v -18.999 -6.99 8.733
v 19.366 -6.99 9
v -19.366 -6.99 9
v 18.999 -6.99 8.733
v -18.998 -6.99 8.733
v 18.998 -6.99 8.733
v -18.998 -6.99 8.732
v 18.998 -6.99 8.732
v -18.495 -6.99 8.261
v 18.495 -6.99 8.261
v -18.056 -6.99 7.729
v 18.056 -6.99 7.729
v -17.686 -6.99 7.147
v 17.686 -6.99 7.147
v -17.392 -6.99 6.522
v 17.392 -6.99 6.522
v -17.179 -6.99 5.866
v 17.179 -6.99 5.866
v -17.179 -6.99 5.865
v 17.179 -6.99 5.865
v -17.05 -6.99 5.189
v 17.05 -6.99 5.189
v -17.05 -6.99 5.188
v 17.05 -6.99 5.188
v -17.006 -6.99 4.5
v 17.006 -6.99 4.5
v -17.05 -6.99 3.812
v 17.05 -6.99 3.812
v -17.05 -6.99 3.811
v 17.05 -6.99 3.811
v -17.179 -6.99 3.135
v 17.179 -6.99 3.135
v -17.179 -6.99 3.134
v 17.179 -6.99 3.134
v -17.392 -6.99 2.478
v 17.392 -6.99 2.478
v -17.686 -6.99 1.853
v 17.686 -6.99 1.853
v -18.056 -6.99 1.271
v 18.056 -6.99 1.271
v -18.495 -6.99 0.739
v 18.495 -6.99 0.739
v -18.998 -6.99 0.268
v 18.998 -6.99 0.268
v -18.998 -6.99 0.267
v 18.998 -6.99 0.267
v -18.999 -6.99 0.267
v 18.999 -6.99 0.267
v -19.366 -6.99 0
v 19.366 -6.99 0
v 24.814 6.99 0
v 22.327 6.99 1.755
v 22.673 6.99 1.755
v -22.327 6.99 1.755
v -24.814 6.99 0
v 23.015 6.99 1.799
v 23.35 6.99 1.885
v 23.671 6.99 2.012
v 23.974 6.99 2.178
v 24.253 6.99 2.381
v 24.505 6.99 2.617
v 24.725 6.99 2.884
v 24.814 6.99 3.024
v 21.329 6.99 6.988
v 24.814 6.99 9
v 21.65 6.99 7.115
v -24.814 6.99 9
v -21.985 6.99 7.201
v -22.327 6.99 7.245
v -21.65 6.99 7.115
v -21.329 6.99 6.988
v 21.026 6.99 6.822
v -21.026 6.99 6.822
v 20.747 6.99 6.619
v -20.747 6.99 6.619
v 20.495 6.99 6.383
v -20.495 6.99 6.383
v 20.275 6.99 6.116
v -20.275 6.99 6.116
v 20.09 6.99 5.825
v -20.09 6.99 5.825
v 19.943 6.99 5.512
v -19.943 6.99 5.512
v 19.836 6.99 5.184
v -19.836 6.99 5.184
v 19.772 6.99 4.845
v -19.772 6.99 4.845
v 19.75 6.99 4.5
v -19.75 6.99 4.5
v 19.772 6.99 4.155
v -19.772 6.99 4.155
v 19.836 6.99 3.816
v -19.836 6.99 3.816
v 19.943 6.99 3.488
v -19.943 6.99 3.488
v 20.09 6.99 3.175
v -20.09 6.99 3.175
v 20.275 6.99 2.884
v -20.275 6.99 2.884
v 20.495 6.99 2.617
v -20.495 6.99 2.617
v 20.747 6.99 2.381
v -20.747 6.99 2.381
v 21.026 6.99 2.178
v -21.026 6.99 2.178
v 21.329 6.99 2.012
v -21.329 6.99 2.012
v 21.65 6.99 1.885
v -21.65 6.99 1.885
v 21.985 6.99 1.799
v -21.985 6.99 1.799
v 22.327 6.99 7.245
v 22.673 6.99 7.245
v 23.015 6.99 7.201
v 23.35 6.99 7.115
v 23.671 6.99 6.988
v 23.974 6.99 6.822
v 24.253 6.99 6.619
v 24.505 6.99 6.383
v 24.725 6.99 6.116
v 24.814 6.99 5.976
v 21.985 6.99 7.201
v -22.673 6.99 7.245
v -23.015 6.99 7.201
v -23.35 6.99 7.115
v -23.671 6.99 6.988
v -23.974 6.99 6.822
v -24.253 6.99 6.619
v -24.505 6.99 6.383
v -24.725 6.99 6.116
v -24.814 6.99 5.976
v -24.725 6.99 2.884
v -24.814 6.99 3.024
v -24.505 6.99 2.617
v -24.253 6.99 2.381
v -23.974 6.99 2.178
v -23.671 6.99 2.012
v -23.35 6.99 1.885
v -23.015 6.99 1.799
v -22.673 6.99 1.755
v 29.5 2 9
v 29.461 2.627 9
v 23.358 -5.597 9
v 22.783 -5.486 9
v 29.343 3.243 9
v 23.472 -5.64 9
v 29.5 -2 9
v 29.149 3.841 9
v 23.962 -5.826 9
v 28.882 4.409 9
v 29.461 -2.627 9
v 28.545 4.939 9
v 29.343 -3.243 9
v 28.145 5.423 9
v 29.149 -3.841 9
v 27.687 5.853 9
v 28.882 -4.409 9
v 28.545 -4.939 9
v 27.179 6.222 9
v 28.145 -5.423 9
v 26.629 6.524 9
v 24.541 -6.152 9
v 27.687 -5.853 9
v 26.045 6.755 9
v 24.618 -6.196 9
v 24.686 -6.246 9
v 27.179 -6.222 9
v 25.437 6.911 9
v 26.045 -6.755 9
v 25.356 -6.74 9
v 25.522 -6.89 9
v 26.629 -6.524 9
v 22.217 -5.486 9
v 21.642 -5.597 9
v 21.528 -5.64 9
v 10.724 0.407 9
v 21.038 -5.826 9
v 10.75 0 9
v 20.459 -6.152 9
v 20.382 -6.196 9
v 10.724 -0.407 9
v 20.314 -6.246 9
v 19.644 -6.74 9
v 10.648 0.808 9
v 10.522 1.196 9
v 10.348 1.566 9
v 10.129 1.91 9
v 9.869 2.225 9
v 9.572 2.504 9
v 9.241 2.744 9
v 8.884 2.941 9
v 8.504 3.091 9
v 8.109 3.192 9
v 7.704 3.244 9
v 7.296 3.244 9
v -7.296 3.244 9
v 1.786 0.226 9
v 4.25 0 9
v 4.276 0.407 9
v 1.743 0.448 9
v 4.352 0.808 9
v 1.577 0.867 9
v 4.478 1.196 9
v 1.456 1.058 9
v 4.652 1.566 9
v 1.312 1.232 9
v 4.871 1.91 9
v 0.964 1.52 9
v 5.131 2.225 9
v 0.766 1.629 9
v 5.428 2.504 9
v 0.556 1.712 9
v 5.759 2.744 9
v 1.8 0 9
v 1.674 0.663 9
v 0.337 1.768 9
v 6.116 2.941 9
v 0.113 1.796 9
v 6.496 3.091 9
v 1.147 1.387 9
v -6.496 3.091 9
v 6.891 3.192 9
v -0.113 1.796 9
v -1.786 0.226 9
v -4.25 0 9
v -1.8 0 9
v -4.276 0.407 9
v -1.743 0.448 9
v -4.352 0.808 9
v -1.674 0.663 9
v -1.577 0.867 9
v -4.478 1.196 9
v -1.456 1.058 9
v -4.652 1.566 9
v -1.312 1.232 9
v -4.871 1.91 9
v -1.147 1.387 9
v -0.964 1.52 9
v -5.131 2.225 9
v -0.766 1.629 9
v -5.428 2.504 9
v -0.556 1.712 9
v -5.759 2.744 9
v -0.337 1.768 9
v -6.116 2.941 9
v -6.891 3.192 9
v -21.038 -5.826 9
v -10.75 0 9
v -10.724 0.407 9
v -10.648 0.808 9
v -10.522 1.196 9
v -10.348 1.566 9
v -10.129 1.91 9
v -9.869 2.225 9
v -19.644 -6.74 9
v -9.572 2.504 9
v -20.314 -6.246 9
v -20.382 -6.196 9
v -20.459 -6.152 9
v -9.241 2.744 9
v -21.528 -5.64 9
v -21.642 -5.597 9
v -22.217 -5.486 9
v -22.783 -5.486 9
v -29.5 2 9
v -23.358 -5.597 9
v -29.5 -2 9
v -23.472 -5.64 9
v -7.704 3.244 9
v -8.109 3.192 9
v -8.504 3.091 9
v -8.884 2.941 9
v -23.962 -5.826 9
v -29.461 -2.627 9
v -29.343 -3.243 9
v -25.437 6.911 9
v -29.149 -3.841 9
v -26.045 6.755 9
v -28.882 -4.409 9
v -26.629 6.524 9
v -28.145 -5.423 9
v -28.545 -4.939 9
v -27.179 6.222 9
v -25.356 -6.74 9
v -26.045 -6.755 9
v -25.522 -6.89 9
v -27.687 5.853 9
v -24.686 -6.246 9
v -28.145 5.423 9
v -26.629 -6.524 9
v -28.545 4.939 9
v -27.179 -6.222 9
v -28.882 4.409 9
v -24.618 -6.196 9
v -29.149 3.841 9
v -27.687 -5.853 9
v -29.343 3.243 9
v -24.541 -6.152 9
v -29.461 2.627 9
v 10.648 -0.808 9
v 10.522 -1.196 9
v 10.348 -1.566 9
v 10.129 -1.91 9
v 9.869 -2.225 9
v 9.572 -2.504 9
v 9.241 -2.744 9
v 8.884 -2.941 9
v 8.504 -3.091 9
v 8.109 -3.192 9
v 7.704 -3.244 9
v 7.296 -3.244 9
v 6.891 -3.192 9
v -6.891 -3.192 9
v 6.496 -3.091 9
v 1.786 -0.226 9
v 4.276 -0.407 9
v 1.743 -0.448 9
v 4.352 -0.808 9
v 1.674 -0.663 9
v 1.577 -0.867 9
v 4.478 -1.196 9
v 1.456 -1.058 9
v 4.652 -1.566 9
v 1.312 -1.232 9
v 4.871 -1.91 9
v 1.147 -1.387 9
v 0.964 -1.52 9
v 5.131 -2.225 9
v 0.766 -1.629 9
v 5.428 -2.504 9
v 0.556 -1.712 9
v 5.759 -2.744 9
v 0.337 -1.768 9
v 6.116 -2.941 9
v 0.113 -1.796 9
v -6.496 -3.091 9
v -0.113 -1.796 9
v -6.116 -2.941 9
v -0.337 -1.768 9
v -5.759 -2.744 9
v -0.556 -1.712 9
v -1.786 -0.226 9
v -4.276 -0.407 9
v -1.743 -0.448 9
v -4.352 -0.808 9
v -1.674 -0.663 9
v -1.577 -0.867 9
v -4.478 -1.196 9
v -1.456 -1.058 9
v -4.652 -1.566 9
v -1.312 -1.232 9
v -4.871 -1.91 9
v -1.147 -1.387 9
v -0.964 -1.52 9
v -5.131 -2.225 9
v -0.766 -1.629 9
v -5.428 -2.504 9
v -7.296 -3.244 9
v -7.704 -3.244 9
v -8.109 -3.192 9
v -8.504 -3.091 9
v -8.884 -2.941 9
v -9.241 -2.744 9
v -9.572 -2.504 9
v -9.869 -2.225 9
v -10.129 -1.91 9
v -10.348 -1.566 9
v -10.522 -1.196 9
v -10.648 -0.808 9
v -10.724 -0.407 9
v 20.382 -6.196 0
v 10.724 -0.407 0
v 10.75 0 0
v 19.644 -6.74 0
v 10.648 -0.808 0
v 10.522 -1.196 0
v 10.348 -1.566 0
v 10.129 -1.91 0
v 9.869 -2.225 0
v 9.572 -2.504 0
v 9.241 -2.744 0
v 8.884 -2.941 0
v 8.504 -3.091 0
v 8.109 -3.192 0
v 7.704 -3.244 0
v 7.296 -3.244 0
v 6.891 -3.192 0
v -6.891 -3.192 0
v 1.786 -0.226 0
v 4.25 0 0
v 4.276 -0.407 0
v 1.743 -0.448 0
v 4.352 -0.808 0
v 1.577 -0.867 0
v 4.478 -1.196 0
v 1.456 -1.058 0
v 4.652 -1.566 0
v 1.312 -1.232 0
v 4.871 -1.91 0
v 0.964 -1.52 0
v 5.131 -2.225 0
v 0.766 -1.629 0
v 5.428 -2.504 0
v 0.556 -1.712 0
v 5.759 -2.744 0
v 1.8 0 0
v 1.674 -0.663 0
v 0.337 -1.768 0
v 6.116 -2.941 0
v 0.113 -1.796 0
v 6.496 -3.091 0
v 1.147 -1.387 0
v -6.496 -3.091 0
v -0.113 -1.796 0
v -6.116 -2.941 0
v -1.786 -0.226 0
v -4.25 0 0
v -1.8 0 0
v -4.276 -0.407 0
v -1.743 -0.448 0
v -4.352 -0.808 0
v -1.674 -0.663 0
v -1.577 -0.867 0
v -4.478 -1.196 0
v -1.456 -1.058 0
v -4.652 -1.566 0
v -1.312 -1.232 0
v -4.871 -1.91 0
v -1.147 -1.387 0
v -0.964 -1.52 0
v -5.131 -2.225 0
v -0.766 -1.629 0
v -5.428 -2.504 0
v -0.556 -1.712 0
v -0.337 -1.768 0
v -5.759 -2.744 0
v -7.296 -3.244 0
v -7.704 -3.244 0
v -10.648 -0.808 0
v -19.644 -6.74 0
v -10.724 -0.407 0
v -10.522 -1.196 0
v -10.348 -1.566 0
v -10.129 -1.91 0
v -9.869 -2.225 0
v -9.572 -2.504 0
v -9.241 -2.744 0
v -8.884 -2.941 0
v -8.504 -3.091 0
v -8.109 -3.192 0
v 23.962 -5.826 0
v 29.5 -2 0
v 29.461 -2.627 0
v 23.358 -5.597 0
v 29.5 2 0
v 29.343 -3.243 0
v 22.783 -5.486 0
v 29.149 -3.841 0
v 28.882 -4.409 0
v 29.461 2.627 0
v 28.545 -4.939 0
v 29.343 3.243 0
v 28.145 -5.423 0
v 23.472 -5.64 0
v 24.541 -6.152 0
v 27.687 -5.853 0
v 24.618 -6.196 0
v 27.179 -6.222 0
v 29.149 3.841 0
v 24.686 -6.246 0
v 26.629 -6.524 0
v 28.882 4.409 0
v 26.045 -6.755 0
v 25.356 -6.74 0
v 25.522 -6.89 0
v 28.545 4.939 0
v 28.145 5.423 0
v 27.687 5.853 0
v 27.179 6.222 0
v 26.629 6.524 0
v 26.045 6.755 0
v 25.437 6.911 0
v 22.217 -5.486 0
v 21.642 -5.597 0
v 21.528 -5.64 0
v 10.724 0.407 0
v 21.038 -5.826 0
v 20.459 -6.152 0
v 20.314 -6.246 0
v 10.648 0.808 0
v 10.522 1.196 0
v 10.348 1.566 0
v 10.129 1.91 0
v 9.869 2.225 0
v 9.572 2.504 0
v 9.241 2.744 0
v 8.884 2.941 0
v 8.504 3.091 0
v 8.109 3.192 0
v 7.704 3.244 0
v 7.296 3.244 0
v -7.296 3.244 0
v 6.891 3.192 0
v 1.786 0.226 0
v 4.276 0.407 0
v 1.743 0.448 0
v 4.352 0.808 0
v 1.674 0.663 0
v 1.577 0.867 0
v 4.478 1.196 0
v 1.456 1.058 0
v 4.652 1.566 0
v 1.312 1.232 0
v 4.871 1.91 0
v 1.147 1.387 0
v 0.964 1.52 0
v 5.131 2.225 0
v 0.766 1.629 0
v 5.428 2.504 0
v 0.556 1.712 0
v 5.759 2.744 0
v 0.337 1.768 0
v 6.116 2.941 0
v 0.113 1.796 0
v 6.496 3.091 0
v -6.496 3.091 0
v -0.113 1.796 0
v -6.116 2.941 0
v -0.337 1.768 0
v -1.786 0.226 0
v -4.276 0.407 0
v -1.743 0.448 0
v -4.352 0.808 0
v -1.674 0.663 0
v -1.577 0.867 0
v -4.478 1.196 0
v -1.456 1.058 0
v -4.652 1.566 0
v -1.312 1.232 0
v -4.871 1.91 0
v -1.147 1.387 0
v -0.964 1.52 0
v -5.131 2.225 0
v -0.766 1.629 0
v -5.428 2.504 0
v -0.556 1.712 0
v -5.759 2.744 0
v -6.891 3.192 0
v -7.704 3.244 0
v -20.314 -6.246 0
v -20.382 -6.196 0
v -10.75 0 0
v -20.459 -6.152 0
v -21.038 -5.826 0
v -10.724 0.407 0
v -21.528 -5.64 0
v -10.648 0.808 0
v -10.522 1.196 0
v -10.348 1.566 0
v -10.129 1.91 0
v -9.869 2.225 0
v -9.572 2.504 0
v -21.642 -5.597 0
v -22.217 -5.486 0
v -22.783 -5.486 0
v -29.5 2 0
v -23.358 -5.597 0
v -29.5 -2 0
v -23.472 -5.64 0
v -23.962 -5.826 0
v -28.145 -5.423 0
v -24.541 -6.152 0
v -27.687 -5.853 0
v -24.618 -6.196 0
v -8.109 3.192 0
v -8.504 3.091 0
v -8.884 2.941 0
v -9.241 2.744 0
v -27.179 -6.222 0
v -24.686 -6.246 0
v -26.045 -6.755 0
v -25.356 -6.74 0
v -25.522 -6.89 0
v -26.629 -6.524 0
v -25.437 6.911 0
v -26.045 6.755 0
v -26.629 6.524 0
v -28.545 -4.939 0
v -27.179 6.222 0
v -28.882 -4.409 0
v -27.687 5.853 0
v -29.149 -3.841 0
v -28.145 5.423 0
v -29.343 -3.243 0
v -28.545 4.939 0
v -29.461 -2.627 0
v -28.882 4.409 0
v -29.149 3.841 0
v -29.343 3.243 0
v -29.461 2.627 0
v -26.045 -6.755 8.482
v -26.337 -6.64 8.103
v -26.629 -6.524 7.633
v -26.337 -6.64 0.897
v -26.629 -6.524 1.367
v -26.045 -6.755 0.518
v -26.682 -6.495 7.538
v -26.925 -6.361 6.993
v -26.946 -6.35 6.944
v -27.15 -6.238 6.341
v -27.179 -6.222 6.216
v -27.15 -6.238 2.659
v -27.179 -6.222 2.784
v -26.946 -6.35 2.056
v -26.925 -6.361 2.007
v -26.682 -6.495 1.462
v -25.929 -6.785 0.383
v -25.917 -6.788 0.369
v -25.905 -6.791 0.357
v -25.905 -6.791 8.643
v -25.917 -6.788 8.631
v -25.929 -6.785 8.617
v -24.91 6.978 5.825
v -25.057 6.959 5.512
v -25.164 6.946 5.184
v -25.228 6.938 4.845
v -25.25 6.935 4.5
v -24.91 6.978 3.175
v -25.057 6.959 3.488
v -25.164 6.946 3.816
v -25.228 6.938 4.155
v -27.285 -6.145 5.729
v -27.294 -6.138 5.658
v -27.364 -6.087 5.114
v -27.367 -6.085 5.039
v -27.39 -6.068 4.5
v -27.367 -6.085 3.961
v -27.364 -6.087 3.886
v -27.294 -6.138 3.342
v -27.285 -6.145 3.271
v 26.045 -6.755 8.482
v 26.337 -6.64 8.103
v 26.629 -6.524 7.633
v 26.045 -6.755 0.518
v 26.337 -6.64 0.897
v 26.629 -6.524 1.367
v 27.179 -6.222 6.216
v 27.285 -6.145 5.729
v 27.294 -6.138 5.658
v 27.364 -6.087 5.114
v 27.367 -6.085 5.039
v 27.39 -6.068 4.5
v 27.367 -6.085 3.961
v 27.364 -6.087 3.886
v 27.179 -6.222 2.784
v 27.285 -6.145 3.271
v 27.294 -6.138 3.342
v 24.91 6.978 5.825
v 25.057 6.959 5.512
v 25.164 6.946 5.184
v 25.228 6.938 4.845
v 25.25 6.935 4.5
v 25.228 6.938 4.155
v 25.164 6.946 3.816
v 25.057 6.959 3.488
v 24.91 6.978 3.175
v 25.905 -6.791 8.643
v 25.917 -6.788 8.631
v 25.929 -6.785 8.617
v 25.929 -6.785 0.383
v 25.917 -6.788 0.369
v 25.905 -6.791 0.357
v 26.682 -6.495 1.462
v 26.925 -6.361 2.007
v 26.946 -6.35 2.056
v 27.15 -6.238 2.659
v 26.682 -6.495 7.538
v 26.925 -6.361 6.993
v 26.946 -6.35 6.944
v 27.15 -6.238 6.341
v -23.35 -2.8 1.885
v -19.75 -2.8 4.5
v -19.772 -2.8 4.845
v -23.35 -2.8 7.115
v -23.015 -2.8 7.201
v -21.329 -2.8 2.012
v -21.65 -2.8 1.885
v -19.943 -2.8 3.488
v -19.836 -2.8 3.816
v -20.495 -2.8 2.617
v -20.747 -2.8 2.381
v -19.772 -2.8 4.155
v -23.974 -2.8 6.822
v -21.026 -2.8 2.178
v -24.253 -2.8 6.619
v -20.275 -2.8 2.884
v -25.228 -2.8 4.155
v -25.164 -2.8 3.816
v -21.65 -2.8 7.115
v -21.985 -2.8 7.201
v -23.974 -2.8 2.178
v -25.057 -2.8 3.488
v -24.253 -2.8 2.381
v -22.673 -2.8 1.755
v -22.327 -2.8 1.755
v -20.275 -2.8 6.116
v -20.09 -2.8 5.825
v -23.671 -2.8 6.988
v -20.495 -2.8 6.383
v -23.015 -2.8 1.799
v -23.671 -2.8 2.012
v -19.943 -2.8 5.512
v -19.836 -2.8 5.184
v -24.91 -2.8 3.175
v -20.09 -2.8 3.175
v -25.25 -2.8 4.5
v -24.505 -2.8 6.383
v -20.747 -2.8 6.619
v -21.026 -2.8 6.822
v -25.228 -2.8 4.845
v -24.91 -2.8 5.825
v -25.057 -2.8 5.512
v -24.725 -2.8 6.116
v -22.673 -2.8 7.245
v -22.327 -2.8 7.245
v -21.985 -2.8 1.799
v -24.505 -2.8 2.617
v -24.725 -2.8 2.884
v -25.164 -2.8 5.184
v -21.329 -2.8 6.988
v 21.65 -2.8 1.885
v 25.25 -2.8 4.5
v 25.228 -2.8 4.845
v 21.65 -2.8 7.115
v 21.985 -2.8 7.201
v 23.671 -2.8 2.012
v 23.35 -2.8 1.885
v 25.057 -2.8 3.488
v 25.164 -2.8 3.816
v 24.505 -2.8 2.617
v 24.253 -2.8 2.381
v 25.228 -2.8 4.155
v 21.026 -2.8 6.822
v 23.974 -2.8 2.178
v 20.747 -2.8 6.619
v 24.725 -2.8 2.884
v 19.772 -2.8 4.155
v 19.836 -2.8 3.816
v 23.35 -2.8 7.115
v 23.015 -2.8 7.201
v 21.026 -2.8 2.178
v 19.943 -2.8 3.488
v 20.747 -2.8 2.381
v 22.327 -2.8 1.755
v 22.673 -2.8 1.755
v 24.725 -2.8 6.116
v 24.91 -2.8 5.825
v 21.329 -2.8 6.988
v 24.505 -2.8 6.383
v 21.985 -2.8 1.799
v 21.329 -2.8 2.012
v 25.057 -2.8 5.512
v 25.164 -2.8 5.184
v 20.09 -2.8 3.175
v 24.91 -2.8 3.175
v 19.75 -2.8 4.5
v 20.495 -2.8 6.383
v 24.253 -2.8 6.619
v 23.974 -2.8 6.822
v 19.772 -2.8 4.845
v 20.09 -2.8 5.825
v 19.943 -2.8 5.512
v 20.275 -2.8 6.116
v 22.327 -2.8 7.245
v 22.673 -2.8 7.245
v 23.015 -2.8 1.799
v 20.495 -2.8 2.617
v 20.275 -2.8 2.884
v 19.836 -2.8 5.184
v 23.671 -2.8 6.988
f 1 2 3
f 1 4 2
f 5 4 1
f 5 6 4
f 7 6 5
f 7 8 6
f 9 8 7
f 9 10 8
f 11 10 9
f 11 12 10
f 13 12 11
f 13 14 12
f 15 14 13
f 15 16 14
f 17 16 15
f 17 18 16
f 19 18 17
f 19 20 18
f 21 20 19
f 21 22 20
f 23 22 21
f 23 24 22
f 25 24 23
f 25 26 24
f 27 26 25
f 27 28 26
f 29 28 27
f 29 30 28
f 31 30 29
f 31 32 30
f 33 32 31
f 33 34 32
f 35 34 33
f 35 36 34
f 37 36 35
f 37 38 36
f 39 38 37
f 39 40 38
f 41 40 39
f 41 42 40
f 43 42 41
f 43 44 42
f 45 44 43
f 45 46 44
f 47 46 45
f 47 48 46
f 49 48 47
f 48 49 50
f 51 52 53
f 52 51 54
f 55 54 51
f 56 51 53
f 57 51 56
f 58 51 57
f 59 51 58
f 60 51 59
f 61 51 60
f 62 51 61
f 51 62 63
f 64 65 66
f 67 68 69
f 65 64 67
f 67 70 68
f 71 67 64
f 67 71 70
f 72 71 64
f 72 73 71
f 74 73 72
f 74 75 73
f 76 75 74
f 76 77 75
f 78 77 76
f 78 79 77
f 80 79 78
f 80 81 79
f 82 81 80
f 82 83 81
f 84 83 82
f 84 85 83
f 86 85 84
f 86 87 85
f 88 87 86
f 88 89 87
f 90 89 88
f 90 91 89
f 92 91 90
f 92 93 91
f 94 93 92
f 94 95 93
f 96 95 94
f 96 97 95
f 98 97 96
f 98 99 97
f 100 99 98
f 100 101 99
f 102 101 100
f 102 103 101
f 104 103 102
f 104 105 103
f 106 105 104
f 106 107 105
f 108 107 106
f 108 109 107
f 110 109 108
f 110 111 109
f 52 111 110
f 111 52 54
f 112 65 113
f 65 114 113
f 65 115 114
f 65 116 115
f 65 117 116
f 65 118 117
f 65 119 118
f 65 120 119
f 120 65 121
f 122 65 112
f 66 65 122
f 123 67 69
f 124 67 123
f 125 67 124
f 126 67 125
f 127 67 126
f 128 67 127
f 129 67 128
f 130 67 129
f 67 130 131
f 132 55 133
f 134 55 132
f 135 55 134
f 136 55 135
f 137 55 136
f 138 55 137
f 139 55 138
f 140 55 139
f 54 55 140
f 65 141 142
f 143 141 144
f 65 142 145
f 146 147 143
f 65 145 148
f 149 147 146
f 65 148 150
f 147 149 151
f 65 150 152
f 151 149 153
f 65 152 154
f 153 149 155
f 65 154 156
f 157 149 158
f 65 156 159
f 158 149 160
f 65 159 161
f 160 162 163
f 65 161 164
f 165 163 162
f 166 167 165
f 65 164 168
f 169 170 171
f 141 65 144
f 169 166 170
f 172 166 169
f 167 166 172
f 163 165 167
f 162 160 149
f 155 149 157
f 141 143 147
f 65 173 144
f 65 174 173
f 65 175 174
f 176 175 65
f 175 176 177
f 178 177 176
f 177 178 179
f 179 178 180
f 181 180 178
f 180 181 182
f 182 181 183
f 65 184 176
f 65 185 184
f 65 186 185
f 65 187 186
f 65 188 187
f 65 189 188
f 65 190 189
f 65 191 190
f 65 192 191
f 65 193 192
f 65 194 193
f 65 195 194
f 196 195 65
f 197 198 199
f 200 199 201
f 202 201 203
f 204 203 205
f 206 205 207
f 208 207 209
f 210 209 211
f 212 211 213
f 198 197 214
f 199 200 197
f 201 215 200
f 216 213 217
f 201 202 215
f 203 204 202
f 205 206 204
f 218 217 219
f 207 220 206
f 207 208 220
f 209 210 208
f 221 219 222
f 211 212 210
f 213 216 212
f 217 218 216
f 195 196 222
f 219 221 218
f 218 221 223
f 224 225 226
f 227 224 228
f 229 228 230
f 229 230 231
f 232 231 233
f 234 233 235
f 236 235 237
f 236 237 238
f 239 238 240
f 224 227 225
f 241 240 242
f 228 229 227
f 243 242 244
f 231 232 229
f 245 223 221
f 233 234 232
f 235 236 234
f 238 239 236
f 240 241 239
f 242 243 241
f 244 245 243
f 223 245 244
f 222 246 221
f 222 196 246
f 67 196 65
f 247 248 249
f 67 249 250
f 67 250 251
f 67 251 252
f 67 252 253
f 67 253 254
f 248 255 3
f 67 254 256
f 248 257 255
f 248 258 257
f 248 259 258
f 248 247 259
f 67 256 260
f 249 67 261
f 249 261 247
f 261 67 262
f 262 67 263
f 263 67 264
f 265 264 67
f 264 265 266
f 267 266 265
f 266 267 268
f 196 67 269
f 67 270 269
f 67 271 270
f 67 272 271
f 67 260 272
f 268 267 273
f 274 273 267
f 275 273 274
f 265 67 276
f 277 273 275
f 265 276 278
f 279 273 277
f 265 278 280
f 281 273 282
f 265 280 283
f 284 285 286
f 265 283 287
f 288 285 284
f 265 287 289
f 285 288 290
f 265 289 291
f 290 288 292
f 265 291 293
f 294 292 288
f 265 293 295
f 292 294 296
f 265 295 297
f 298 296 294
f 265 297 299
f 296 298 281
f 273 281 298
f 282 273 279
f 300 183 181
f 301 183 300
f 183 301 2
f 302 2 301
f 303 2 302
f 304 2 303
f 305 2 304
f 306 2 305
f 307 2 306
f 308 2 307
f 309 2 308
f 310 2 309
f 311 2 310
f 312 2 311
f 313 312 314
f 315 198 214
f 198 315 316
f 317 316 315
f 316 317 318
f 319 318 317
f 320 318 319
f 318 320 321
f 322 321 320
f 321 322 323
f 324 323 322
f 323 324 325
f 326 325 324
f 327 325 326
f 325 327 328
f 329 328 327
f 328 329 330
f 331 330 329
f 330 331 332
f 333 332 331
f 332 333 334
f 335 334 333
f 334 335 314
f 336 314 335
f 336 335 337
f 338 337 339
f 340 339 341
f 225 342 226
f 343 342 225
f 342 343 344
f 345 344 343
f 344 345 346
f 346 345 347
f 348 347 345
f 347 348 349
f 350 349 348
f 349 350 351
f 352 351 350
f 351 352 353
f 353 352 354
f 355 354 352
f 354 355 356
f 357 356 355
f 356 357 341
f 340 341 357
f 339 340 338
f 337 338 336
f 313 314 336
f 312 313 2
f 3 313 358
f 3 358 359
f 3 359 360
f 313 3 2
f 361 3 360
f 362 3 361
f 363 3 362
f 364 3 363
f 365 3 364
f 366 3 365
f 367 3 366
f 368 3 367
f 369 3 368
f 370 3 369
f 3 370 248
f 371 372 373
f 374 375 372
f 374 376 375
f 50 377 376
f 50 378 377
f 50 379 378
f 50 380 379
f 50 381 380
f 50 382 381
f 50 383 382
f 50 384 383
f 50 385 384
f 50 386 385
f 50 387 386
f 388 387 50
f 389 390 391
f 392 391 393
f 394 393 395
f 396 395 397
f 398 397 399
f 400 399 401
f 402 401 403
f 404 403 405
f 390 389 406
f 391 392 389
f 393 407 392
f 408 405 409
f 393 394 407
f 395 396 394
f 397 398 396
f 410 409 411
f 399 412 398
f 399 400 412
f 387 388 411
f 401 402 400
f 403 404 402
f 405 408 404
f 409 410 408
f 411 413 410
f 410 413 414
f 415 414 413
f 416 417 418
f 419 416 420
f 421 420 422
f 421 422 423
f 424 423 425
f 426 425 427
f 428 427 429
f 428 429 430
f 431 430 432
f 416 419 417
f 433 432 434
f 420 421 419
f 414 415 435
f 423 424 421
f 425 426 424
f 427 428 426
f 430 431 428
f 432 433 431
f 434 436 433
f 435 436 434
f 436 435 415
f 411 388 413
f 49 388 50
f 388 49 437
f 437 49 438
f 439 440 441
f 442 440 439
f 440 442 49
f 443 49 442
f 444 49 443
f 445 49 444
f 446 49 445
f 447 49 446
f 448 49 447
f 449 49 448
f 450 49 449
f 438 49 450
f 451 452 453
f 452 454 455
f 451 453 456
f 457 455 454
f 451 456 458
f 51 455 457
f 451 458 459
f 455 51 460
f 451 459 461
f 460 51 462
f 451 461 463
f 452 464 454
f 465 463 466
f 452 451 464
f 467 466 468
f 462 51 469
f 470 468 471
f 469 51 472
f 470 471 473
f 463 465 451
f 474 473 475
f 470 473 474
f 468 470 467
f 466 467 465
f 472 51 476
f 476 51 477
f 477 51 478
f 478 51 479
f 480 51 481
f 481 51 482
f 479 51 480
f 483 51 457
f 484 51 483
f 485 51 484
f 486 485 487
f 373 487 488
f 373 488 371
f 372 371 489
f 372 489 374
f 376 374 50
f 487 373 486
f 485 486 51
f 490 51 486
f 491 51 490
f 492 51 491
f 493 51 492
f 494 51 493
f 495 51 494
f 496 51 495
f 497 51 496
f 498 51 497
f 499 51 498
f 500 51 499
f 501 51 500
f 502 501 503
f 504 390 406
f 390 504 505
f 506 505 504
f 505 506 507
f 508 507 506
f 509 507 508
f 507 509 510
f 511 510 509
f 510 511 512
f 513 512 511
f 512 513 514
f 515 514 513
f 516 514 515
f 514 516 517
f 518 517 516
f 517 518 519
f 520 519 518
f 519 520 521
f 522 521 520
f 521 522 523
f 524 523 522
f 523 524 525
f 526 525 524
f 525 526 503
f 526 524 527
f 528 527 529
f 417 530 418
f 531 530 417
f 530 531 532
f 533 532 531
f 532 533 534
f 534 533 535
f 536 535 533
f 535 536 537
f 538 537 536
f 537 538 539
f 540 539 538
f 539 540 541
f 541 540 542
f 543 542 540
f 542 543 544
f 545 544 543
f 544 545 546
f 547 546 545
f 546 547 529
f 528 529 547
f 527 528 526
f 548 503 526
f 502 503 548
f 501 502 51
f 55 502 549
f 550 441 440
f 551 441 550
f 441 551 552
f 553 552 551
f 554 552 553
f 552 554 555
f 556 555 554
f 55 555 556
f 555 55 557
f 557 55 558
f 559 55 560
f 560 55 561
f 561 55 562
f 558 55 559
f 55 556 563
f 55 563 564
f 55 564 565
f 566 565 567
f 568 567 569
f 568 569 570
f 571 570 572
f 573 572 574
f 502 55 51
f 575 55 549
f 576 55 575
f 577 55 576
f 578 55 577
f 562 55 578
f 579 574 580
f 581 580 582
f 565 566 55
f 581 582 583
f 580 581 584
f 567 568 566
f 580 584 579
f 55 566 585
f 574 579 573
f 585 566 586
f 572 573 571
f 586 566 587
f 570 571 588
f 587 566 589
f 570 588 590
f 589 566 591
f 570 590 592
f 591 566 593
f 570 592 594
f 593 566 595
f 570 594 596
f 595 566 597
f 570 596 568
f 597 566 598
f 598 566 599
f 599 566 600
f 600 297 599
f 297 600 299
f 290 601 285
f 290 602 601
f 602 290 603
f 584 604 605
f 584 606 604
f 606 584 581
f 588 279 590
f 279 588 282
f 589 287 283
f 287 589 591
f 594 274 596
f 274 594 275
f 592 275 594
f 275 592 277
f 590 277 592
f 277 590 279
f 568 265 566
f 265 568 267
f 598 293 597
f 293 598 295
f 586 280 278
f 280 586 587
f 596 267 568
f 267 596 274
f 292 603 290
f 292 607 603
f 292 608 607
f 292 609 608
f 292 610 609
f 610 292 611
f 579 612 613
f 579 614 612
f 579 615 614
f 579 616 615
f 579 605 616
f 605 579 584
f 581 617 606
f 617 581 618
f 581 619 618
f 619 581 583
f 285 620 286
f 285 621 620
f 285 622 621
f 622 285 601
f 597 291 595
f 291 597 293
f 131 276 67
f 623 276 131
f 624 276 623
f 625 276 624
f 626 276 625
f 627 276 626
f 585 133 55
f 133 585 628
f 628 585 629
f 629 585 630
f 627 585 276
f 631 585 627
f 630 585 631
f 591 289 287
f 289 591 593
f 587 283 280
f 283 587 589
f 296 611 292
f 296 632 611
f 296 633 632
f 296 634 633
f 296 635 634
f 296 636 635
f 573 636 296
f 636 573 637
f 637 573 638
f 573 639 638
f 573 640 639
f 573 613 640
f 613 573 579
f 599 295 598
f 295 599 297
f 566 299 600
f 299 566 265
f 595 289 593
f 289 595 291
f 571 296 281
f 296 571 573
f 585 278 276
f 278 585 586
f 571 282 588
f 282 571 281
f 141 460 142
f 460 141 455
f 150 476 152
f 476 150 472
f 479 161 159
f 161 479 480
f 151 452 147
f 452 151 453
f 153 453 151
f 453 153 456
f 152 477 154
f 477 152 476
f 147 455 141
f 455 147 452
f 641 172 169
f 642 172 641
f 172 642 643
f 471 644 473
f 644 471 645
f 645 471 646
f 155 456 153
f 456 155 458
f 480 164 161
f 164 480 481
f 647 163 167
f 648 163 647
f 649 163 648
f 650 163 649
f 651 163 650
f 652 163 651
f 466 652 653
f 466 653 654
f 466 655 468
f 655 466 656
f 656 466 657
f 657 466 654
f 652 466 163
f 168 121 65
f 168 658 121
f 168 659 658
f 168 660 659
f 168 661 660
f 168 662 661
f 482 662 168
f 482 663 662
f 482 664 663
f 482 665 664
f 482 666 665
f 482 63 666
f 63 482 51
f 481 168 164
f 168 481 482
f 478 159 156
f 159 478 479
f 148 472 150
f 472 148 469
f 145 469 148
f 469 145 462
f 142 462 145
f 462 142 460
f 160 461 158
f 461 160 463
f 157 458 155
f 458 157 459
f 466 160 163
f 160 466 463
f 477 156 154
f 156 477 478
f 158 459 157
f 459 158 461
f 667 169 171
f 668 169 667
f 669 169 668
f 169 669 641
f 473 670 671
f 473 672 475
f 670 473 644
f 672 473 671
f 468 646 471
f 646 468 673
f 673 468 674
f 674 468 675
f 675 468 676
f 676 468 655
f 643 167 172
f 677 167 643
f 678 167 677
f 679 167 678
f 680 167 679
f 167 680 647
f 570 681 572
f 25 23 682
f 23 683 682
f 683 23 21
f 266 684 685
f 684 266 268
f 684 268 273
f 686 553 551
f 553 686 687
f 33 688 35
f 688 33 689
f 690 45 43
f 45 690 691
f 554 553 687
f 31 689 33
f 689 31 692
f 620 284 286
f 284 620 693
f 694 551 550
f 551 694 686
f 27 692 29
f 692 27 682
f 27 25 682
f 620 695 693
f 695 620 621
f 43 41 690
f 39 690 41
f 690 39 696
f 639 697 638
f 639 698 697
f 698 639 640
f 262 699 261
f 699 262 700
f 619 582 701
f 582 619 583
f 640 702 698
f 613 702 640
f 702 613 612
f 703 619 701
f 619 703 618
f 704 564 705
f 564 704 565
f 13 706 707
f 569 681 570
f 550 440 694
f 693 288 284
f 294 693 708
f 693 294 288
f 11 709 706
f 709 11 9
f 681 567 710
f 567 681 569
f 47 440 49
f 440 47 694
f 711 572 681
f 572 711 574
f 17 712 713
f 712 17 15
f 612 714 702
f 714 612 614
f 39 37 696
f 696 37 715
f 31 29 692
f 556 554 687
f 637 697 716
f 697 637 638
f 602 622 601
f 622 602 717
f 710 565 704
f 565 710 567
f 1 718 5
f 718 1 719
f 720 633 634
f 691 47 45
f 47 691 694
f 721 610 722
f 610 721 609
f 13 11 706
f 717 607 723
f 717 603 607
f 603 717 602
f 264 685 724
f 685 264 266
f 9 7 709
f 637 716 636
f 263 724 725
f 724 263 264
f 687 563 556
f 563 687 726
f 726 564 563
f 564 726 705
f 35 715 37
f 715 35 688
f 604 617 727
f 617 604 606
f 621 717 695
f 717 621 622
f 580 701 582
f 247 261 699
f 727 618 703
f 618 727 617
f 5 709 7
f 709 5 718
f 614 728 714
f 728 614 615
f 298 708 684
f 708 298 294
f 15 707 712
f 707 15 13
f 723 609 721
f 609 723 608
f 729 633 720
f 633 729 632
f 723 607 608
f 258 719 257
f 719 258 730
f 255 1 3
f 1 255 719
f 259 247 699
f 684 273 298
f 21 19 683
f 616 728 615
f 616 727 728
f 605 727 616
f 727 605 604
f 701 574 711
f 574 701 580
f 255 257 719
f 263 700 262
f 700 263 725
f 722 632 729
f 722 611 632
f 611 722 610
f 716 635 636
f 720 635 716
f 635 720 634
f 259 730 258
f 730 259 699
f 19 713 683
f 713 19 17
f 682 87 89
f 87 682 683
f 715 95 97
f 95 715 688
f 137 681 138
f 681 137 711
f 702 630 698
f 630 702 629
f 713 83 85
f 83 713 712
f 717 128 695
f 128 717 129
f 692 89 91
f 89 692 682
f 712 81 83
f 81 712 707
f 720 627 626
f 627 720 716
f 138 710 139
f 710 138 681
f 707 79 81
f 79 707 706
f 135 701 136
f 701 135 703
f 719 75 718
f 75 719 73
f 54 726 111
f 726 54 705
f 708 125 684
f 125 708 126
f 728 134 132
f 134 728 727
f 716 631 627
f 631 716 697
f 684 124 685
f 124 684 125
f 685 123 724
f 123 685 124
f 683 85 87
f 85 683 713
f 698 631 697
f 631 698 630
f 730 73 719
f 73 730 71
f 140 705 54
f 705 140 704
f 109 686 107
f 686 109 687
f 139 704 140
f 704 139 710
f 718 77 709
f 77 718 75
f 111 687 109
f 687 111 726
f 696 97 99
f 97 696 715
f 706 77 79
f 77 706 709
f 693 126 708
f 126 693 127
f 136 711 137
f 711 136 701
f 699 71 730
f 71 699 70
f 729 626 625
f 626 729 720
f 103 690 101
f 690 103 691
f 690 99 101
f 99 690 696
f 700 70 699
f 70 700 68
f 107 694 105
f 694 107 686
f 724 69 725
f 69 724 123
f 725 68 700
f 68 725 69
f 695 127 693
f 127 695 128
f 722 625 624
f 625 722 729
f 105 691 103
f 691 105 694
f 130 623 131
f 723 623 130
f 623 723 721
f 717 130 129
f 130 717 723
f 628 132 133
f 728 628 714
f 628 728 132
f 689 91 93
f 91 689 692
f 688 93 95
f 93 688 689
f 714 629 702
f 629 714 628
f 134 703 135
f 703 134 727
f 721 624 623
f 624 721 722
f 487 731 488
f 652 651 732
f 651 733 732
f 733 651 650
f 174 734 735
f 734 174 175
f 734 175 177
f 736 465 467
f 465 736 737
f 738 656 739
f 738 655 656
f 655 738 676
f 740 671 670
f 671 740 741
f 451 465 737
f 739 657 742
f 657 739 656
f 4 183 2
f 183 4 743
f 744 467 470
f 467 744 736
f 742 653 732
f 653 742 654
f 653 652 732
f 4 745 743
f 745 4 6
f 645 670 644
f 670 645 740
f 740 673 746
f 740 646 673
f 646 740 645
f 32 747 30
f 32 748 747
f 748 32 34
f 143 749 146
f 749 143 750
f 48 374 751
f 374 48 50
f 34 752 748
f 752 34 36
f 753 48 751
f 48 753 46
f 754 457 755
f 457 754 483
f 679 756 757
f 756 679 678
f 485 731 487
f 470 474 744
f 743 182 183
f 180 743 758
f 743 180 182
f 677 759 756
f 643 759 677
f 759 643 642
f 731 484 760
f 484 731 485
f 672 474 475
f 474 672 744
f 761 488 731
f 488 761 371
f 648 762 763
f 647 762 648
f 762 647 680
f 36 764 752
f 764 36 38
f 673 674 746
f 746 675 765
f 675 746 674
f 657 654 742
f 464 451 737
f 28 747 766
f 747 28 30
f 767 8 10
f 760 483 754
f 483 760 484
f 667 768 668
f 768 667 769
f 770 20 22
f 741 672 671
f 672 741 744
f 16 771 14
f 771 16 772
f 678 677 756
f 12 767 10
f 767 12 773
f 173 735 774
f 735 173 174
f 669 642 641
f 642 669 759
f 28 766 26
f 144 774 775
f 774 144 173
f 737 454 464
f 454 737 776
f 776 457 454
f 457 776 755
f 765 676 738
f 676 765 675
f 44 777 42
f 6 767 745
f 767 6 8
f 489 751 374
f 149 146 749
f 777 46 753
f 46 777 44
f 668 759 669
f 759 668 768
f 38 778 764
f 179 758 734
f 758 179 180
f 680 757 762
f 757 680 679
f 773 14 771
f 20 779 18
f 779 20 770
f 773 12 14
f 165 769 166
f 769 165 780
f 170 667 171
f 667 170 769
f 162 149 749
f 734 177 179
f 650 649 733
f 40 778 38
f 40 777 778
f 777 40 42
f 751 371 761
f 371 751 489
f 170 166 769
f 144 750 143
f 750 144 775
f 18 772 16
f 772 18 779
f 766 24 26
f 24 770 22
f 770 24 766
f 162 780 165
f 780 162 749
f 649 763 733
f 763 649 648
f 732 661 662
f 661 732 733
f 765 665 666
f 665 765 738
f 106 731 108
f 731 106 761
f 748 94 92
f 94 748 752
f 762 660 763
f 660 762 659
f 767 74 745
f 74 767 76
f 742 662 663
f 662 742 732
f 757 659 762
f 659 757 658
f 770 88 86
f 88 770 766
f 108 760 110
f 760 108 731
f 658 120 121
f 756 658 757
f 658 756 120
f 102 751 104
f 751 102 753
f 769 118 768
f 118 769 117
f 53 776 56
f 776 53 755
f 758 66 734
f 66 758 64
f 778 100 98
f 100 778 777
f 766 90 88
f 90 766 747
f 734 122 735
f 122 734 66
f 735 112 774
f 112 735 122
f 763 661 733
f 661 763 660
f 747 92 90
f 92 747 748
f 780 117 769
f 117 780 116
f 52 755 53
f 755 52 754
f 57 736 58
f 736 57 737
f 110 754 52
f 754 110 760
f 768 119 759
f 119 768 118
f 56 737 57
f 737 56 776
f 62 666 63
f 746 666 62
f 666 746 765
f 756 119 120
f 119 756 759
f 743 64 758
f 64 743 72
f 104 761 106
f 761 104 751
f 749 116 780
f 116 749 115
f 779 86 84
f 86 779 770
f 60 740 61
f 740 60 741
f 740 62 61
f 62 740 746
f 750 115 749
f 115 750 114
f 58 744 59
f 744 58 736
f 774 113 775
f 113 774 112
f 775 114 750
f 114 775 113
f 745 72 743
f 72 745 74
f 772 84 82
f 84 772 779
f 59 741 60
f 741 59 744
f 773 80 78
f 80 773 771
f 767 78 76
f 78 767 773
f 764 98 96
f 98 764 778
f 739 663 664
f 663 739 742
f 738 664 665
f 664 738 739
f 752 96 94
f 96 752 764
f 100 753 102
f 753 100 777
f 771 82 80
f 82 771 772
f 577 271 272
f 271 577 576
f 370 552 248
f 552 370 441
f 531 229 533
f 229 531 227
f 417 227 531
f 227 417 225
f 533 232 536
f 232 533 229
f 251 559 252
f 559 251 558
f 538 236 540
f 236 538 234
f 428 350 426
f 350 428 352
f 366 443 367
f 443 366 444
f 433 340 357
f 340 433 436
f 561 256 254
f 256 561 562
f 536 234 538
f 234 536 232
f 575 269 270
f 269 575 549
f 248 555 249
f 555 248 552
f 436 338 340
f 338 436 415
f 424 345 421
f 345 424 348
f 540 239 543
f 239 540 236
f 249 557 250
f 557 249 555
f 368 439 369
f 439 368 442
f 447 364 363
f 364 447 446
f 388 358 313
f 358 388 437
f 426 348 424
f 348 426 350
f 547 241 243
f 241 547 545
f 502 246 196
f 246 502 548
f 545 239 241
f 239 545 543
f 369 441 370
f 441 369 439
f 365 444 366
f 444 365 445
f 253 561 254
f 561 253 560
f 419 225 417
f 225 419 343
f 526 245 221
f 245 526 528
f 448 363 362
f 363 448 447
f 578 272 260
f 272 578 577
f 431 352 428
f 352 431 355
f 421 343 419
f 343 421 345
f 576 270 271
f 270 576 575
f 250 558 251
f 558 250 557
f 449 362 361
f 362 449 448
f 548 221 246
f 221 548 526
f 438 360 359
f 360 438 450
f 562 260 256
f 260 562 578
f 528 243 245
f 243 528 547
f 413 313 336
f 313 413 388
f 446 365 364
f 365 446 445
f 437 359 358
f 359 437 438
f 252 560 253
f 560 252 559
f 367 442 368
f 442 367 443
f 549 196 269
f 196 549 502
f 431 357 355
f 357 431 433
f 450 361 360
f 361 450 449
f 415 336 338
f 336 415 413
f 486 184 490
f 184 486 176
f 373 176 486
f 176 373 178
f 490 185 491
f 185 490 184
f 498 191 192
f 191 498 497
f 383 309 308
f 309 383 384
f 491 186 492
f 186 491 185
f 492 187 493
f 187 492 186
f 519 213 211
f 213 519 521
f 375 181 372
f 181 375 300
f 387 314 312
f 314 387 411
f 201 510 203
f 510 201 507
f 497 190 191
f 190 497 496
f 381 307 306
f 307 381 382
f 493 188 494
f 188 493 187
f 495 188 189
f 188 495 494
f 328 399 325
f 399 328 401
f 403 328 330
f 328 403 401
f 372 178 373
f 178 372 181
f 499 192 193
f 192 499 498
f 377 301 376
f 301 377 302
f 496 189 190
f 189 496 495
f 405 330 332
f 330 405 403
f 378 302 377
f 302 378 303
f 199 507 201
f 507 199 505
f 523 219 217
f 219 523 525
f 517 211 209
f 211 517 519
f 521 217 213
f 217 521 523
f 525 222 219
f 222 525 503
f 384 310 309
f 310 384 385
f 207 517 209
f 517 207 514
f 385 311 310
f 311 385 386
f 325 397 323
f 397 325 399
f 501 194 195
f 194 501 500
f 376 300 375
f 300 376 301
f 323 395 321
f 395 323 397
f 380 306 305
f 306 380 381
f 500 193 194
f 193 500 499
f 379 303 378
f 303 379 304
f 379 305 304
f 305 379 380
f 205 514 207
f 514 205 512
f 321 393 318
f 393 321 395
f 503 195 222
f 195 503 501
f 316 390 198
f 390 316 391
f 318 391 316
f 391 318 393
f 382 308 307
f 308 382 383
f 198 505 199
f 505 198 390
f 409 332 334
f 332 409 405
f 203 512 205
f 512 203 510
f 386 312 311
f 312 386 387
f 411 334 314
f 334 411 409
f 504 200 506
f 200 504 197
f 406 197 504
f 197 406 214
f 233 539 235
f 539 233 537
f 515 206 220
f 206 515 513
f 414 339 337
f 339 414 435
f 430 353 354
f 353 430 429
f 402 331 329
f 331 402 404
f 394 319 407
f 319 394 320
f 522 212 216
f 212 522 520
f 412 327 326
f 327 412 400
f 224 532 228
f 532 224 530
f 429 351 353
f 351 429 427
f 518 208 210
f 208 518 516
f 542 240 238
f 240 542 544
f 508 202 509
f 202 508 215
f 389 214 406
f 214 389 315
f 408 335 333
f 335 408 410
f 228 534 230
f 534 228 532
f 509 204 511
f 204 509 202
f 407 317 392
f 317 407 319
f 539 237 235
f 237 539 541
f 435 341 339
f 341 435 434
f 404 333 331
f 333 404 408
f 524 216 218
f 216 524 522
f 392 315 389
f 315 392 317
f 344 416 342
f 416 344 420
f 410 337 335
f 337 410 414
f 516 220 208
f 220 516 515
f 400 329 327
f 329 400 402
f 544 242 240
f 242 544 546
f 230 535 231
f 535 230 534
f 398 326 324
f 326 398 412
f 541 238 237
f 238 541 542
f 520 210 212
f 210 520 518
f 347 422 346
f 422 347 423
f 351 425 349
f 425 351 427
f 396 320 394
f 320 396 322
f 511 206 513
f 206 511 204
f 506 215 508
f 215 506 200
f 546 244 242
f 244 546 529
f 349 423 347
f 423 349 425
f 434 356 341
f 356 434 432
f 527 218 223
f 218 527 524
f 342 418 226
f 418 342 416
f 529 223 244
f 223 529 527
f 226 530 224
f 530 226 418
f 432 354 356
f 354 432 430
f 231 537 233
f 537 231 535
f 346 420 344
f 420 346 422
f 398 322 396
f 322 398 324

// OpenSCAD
$fn = 50;


difference() {
	union() {
		hull() {
			translate(v = [-9.5000000000, 2.0000000000, 0]) {
				cylinder(h = 9, r = 5);
			}
			translate(v = [9.5000000000, 2.0000000000, 0]) {
				cylinder(h = 9, r = 5);
			}
			translate(v = [-9.5000000000, -2.0000000000, 0]) {
				cylinder(h = 9, r = 5);
			}
			translate(v = [9.5000000000, -2.0000000000, 0]) {
				cylinder(h = 9, r = 5);
			}
		}
		translate(v = [-15.0000000000, 0.0000000000, 0]) {
			hull() {
				translate(v = [-9.5000000000, 2.0000000000, 0]) {
					cylinder(h = 9, r = 5);
				}
				translate(v = [9.5000000000, 2.0000000000, 0]) {
					cylinder(h = 9, r = 5);
				}
				translate(v = [-9.5000000000, -2.0000000000, 0]) {
					cylinder(h = 9, r = 5);
				}
				translate(v = [9.5000000000, -2.0000000000, 0]) {
					cylinder(h = 9, r = 5);
				}
			}
		}
		translate(v = [15.0000000000, 0.0000000000, 0]) {
			hull() {
				translate(v = [-9.5000000000, 2.0000000000, 0]) {
					cylinder(h = 9, r = 5);
				}
				translate(v = [9.5000000000, 2.0000000000, 0]) {
					cylinder(h = 9, r = 5);
				}
				translate(v = [-9.5000000000, -2.0000000000, 0]) {
					cylinder(h = 9, r = 5);
				}
				translate(v = [9.5000000000, -2.0000000000, 0]) {
					cylinder(h = 9, r = 5);
				}
			}
		}
	}
	union() {
		translate(v = [-22.5000000000, -7.0000000000, 4.5000000000]) {
			rotate(a = [90, 0, 0]) {
				difference() {
					union() {
						#translate(v = [0, 0, -14.0000000000]) {
							cylinder(h = 14, r = 2.2500000000);
						}
						#translate(v = [0, 0, -4.2000000000]) {
							cylinder(h = 4.2000000000, r1 = 2.7500000000, r2 = 5.5000000000);
						}
						#translate(v = [0, 0, -14.0000000000]) {
							cylinder(h = 14, r = 2.7500000000);
						}
						#translate(v = [0, 0, -14.0000000000]) {
							cylinder(h = 14, r = 2.2500000000);
						}
					}
					union();
				}
			}
		}
		translate(v = [22.5000000000, -7.0000000000, 4.5000000000]) {
			rotate(a = [90, 0, 0]) {
				difference() {
					union() {
						#translate(v = [0, 0, -14.0000000000]) {
							cylinder(h = 14, r = 2.2500000000);
						}
						#translate(v = [0, 0, -4.2000000000]) {
							cylinder(h = 4.2000000000, r1 = 2.7500000000, r2 = 5.5000000000);
						}
						#translate(v = [0, 0, -14.0000000000]) {
							cylinder(h = 14, r = 2.7500000000);
						}
						#translate(v = [0, 0, -14.0000000000]) {
							cylinder(h = 14, r = 2.2500000000);
						}
					}
					union();
				}
			}
		}
		translate(v = [-7.5000000000, 0.0000000000, 0]) {
			translate(v = [0, 0, -100]) {
				cylinder(h = 200, r = 3.2500000000);
			}
		}
		translate(v = [7.5000000000, 0.0000000000, 0]) {
			translate(v = [0, 0, -100]) {
				cylinder(h = 200, r = 3.2500000000);
			}
		}
		translate(v = [-7.5000000000, 0.0000000000, 0]) {
			translate(v = [0, 0, -100]) {
				cylinder(h = 200, r = 1.8000000000);
			}
		}
		translate(v = [0, 0, -100]) {
			cylinder(h = 200, r = 1.8000000000);
		}
		translate(v = [7.5000000000, 0.0000000000, 0]) {
			translate(v = [0, 0, -100]) {
				cylinder(h = 200, r = 1.8000000000);
			}
		}
	}
}
